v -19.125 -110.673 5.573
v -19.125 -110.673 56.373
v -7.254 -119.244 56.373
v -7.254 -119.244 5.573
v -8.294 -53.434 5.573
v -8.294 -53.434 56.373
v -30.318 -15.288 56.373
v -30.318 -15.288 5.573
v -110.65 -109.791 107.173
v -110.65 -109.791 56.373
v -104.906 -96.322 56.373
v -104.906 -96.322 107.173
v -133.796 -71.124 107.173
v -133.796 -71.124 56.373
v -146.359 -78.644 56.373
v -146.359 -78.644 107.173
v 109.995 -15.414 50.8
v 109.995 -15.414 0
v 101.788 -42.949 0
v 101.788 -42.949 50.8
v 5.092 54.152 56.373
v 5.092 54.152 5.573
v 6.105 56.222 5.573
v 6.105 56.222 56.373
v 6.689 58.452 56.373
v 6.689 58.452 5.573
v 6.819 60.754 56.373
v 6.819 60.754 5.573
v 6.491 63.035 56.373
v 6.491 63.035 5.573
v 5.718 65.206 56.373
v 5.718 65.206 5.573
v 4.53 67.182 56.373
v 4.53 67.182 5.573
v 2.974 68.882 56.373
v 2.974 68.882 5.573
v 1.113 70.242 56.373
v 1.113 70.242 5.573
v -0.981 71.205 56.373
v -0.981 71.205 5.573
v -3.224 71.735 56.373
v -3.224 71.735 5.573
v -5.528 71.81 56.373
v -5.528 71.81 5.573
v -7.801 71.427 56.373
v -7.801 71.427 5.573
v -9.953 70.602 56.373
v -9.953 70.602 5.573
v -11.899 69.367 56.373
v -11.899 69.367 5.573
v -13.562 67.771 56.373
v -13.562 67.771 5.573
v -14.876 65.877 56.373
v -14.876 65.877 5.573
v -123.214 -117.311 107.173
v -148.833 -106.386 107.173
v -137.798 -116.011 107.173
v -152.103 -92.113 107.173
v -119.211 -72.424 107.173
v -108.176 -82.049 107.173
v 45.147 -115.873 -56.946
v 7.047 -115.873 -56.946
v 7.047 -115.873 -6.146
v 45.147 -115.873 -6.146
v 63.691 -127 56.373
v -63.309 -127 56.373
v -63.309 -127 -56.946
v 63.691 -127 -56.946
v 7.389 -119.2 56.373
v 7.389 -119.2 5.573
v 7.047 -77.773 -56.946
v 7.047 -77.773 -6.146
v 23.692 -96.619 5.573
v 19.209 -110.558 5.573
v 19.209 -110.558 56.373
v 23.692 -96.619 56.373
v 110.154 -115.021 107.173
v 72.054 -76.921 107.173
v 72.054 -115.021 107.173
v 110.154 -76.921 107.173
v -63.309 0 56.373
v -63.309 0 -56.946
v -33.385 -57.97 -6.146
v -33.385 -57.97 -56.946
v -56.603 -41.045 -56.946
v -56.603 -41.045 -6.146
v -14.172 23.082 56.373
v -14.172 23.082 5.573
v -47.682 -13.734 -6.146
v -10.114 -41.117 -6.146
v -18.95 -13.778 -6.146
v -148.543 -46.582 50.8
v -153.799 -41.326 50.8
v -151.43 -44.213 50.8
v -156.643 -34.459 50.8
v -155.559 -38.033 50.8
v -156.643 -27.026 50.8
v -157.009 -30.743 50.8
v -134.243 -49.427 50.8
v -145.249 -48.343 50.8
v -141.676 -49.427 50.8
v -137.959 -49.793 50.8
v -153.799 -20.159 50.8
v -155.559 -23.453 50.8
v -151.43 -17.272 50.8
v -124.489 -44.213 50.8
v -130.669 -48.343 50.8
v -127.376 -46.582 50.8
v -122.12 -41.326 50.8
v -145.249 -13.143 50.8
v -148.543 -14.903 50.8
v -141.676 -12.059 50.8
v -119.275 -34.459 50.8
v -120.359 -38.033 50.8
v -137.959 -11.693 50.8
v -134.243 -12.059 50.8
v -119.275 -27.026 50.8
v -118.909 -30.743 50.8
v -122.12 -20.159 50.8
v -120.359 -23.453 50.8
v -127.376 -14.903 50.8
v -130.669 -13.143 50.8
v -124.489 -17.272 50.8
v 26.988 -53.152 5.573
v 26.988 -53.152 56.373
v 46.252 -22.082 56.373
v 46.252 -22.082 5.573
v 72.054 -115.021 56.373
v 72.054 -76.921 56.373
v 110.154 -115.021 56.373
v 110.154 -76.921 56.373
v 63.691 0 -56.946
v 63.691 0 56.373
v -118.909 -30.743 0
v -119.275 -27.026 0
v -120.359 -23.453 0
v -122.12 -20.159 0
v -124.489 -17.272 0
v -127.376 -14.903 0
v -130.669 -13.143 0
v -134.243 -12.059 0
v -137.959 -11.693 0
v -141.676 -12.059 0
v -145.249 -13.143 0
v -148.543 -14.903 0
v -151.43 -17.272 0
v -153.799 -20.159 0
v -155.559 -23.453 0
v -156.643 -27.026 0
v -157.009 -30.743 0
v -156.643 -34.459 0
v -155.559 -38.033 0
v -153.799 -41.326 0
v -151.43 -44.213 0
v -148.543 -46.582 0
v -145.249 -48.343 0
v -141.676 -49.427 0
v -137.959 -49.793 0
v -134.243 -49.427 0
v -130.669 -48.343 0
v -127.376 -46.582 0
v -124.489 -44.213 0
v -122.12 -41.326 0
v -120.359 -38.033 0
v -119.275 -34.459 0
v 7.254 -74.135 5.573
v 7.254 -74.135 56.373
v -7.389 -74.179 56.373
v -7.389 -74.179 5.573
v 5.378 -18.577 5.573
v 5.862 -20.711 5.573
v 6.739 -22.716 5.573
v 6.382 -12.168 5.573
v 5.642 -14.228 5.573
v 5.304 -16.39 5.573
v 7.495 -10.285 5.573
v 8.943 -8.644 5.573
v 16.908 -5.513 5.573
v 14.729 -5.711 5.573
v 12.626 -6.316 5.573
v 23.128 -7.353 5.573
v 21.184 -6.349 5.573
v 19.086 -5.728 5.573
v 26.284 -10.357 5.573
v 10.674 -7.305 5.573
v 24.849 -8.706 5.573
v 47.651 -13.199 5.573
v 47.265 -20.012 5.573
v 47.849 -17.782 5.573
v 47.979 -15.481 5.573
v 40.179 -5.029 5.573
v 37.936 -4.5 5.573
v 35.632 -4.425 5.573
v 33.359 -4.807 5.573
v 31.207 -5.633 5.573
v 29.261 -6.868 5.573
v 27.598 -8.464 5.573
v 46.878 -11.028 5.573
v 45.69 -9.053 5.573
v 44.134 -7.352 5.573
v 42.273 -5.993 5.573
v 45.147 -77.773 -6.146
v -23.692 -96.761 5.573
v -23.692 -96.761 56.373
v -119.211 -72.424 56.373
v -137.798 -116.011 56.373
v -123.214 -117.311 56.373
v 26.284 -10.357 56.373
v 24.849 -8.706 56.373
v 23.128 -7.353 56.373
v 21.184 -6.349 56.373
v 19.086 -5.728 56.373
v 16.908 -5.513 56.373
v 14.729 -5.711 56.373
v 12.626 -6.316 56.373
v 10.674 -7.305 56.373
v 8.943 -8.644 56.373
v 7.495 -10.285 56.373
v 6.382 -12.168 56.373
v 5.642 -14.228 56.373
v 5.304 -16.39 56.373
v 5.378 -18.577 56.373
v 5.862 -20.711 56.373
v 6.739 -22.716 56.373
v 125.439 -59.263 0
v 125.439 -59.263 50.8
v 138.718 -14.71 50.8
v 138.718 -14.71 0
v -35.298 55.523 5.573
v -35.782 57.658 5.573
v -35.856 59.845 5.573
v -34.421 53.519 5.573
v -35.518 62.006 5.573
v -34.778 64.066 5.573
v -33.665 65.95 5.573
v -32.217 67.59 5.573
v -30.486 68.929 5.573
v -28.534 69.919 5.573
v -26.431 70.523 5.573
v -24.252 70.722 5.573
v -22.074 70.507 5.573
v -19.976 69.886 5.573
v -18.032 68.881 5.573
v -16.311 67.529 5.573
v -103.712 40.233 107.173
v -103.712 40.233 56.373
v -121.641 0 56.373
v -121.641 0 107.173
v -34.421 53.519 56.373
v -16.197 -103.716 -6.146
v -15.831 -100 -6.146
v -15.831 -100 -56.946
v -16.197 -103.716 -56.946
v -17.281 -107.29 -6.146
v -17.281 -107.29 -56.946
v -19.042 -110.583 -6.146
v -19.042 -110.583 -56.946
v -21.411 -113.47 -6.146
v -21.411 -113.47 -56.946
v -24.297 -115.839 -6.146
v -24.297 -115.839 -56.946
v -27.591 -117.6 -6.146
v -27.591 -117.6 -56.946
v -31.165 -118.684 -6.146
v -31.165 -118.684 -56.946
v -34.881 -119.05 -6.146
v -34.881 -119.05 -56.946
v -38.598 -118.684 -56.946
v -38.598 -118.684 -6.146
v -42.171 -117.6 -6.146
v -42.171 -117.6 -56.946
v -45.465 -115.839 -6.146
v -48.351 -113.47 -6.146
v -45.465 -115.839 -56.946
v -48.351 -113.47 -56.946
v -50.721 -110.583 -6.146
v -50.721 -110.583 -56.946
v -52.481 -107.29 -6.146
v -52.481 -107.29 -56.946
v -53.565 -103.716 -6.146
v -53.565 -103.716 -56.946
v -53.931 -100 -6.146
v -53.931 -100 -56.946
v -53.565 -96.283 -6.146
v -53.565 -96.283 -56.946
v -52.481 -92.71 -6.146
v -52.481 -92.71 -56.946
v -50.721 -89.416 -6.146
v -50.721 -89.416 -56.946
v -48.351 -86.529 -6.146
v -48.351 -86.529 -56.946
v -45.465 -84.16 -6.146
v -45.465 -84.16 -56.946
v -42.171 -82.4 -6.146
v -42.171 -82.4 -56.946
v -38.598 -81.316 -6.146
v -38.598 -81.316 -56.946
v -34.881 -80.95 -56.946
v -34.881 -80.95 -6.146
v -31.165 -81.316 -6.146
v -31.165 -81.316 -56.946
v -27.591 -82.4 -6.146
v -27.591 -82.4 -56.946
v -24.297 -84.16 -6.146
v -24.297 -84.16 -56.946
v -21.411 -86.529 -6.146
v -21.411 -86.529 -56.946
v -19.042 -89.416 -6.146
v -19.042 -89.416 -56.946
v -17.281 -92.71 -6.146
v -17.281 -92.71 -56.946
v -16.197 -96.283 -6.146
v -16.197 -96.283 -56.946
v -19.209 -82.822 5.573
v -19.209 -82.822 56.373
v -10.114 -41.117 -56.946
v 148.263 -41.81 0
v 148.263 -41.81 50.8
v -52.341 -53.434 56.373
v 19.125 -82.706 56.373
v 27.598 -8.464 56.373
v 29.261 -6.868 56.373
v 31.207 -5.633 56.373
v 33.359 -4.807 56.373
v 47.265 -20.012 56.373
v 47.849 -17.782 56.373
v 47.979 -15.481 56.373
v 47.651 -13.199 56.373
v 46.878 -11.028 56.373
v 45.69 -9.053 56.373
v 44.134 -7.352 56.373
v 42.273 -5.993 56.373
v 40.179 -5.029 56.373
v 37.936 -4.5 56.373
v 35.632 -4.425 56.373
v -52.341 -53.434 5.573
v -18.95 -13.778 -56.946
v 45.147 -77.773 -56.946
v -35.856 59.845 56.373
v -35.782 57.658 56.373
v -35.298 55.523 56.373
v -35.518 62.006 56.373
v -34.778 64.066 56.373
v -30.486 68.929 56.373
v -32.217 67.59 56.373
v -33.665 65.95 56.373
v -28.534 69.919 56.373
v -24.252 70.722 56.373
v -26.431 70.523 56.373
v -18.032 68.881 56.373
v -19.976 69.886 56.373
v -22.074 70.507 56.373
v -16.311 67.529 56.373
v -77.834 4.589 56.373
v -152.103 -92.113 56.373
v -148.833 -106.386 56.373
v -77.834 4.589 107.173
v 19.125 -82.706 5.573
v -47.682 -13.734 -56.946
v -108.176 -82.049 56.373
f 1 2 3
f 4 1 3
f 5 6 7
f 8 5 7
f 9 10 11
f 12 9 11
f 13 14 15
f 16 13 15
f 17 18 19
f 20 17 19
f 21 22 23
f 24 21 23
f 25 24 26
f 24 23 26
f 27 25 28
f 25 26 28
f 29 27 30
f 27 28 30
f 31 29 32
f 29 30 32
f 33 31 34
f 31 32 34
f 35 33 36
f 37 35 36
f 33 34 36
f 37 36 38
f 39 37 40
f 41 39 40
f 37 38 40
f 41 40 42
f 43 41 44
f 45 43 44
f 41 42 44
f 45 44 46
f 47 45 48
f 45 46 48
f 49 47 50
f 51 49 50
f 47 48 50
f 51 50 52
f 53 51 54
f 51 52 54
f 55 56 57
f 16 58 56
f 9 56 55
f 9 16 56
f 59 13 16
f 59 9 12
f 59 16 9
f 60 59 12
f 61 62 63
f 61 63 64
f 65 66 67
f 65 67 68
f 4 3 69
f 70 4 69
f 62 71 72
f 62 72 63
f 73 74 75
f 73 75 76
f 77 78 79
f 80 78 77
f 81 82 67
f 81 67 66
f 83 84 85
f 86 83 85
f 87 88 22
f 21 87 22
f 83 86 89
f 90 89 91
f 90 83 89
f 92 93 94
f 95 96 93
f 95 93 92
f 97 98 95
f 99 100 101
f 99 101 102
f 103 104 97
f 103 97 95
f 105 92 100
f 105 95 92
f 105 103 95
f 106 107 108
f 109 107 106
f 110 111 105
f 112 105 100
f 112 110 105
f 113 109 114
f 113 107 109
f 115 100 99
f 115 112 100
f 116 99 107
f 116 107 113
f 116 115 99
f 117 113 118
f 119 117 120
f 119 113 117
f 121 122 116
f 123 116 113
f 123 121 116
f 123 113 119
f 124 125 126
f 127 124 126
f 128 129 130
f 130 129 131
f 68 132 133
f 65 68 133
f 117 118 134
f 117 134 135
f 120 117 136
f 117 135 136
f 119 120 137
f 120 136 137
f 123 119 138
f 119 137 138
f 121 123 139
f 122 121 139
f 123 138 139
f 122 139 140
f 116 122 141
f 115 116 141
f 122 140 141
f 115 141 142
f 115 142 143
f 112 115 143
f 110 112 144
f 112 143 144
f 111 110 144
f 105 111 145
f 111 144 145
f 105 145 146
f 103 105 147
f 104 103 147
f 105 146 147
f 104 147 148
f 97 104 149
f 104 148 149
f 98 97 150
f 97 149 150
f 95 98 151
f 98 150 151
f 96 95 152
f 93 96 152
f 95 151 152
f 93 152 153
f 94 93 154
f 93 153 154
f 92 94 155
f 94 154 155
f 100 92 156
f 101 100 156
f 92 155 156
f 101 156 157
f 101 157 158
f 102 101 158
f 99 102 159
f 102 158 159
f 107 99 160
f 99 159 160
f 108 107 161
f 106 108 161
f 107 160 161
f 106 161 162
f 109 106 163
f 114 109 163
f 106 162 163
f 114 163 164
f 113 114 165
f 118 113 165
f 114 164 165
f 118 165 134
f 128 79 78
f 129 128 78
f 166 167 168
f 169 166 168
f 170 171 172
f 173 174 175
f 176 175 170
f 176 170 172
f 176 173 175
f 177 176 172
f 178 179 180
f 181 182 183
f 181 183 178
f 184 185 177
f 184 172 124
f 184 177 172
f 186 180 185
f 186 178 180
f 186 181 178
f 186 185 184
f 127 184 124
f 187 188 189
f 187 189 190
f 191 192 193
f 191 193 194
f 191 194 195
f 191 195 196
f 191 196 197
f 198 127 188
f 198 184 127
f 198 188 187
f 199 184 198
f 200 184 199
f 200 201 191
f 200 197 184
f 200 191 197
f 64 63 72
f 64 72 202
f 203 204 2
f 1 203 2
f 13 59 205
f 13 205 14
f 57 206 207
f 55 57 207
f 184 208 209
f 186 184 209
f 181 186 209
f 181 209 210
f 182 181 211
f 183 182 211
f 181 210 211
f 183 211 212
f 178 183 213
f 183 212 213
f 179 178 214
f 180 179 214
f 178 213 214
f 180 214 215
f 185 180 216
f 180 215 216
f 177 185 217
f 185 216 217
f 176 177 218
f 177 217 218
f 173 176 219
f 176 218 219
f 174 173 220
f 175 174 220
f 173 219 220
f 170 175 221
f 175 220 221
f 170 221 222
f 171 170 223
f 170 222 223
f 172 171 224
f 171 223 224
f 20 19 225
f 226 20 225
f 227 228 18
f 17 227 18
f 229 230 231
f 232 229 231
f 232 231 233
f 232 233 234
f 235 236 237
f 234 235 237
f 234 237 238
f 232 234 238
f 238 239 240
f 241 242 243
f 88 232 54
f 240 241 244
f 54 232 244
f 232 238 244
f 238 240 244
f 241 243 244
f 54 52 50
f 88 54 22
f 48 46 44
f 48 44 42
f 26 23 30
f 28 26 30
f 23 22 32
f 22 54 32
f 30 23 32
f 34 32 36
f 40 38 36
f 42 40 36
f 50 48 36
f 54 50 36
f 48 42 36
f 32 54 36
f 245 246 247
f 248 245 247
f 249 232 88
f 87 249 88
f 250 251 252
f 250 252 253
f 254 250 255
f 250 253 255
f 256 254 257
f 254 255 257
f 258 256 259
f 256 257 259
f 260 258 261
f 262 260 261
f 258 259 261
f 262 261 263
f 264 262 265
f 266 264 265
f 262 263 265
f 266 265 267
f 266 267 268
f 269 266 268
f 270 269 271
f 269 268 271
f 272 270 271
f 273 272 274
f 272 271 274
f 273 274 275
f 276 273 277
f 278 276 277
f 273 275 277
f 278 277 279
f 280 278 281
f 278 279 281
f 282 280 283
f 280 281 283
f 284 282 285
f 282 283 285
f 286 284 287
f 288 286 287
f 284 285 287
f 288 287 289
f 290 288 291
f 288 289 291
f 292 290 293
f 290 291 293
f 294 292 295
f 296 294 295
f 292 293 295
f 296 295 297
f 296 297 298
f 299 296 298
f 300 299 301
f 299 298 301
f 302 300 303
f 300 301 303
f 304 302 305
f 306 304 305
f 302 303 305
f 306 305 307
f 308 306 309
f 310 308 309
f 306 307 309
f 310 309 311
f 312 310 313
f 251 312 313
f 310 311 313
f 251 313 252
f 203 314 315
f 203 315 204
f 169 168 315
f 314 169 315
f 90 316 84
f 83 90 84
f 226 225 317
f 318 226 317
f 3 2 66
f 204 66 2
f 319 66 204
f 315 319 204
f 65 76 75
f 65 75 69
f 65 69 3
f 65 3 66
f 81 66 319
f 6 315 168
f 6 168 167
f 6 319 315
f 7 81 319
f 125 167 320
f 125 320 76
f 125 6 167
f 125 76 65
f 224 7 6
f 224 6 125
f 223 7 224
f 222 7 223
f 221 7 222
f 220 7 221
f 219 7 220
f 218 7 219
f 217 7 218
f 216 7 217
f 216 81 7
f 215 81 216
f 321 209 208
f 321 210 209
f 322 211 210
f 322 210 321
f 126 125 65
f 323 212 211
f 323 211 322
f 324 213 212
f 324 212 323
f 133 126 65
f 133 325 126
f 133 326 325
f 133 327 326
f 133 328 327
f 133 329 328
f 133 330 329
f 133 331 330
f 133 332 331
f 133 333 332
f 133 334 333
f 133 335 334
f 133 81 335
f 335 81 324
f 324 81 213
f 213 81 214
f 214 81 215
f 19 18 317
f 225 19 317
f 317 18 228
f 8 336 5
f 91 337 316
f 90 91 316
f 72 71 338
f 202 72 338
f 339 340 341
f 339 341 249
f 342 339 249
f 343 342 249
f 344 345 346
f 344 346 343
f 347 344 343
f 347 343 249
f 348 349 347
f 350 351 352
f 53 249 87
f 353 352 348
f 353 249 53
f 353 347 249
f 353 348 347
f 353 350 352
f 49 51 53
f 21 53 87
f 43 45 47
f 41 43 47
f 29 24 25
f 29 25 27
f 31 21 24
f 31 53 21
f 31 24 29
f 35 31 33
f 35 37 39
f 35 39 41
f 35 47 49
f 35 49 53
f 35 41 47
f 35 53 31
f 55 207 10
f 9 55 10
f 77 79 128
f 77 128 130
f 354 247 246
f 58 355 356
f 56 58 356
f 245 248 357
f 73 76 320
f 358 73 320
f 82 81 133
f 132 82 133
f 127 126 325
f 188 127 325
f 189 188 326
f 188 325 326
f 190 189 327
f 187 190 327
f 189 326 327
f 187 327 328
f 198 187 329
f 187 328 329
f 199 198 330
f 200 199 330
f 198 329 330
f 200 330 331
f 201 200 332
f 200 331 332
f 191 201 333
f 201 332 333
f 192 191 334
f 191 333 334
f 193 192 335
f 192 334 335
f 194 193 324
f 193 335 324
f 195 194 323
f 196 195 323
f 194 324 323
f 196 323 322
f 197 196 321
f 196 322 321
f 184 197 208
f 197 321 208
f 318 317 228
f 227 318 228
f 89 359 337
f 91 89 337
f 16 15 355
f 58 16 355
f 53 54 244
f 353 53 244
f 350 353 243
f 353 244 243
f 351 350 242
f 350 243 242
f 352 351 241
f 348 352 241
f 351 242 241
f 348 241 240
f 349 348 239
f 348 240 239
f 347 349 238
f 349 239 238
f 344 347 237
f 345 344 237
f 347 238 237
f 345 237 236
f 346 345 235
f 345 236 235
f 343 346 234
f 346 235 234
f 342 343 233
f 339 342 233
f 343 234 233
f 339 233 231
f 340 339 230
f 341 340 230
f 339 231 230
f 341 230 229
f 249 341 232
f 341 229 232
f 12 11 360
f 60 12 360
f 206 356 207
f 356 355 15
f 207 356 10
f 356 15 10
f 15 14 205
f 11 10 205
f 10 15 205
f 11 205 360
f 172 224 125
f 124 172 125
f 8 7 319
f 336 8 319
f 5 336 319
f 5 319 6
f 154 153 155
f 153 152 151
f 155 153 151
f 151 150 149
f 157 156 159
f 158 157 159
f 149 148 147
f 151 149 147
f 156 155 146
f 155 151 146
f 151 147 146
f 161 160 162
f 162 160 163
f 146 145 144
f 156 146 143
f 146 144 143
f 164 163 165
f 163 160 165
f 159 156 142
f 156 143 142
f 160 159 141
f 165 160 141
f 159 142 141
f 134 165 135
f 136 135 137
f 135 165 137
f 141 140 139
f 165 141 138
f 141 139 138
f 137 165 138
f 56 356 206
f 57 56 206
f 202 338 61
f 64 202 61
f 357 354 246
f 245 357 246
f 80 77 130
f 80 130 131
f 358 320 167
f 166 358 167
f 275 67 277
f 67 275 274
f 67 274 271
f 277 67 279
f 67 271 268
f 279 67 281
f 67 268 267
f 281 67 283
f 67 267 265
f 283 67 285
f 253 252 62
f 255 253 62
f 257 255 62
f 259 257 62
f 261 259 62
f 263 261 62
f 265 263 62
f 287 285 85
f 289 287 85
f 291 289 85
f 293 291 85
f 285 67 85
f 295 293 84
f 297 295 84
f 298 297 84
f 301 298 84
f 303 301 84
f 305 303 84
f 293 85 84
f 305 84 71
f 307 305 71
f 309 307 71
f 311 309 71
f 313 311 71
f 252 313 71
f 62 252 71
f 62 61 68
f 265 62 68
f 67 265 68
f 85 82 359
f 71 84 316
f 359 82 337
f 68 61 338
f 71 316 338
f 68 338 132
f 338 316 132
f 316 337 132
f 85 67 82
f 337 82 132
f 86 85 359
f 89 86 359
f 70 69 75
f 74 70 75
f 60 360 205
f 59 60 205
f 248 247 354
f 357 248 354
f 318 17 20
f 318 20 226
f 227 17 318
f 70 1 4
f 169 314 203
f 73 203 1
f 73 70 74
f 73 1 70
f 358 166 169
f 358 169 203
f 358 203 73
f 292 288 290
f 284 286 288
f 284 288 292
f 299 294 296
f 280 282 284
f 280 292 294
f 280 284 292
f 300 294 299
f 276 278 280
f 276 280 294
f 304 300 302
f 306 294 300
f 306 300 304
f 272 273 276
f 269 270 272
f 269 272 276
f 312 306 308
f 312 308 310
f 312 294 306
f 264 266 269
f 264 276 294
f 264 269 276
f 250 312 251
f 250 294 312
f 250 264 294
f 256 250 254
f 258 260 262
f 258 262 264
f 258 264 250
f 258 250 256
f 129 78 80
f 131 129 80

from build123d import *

# Parameters (mm, degrees)
F0_W      = 127
F0_H      = 113.3191107269
F1_DEPTH  = 127
F2_R      = 19.05
F3_DEPTH  = 50.8
F4_W      = 38.1
F4_H      = 38.1
F5_DEPTH  = 50.8
F7_DEPTH  = 50.8
F9_DEPTH  = 50.8
F11_DEPTH = 50.8
F13_DEPTH = 50.8
F16_R     = 19.05
F17_DEPTH = 50.8
F14_W     = 38.1
F14_H     = 38.1
F18_DEPTH = 50.8
F20_DEPTH = 50.8
F22_DEPTH = 50.8
F24_DEPTH = 50.8


with BuildPart() as f1:
    # F0 (on Front) → F1 (new body)
    with BuildSketch(Plane.XZ):
        with Locations((0.1909546554, -0.2864338458)):
            Rectangle(F0_W, F0_H)
    extrude(amount=F1_DEPTH)

    # F2 (on face) → F3 (cut)
    with BuildSketch(Plane(origin=(0, 0, -56.9459892092), x_dir=(1, 0, 0), z_dir=(0, 0, -1))):
        with Locations((-34.8810516298, 99.9996215105)):
            Circle(F2_R)
    extrude(amount=-F3_DEPTH, mode=Mode.SUBTRACT)

    # F4 (on face) → F5 (cut)
    with BuildSketch(Plane(origin=(0, 0, -56.9459892092), x_dir=(1, 0, 0), z_dir=(0, 0, -1))):
        with Locations((26.0971351527, 96.8234584603)):
            Rectangle(F4_W, F4_H)
    extrude(amount=-F5_DEPTH, mode=Mode.SUBTRACT)

    # F6 (on face) → F7 (cut)
    with BuildSketch(Plane(origin=(0, 0, -56.9459892092), x_dir=(1, 0, 0), z_dir=(0, 0, -1))):
        Polygon((-56.6030346625, 41.0454806673), (-47.6822181135, 13.7336526435), (-18.9504421823, 13.7780343462), (-10.1140446485, 41.1172917707), (-33.3846265658, 57.9695003836), align=None)
    extrude(amount=-F7_DEPTH, mode=Mode.SUBTRACT)

    # F8 (on face) → F9 (cut)
    with BuildSketch(Plane.XY.offset(56.3731215177)):
        Polygon((-8.294206511, -53.4337777186), (-30.31764359, -15.2880657404), (-52.3410806691, -53.4337777186), align=None)
    extrude(amount=-F9_DEPTH, mode=Mode.SUBTRACT)

    # F10 (on face) → F11 (cut)
    with BuildSketch(Plane.XY.offset(56.3731215177)):
        with BuildLine():
            ThreePointArc((26.2838121714, -10.3574311609), (10.6741557305, -7.3051652924), (6.738505182, -22.7158225105))
            Line((6.738505182, -22.7158225105), (26.9882585853, -53.1520769))
            Line((26.9882585853, -53.1520769), (46.2515082198, -22.0820703393))
            ThreePointArc((46.2515082198, -22.0820703393), (42.2727045666, -5.9928346862), (26.2838121714, -10.3574311609))
        make_face()
    extrude(amount=-F11_DEPTH, mode=Mode.SUBTRACT)

    # F12 (on face) → F13 (cut)
    with BuildSketch(Plane.XY.offset(56.3731215177)):
        Polygon((19.1253523779, -82.7064397891), (7.2535540552, -74.1354135239), (-7.3888553774, -74.1793755884), (-19.2089731938, -82.8215339682), (-23.6919161391, -96.7608778984), (-19.1253523779, -110.6730517785), (-7.2535540552, -119.2440780437), (7.3888553774, -119.2001159792), (19.2089731938, -110.5579575994), (23.6919161391, -96.6186136692), align=None)
    extrude(amount=-F13_DEPTH, mode=Mode.SUBTRACT)


with BuildPart() as f17:
    # F16 (on Top) → F17 (new body)
    with BuildSketch(Plane.XY):
        with Locations((-137.9592269659, -30.7426471263)):
            Circle(F16_R)
    extrude(amount=F17_DEPTH)


with BuildPart() as f18:
    # F14 (on face) → F18 (new body)
    with BuildSketch(Plane.XY.offset(56.3731215177)):
        with Locations((91.1035591245, -95.9713852525)):
            Rectangle(F14_W, F14_H)
    extrude(amount=F18_DEPTH)


with BuildPart() as f18b:
    # F15 (on Top) → F18, piece 2 (new body)
    with BuildSketch(Plane.XY):
        Polygon((148.2630850383, -41.8104374076), (138.7180920668, -14.7104369081), (109.9948949607, -15.4139039698), (101.7879758552, -42.9486710234), (125.4390180111, -59.2626258731), align=None)
    extrude(amount=F18_DEPTH)


with BuildPart() as f20:
    # F19 (on face) → F20 (new body)
    with BuildSketch(Plane.XY.offset(56.3731215177)):
        Polygon((-133.7956904605, -71.1238104015), (-146.3593086234, -78.6442881331), (-152.1030633272, -92.1131918953), (-148.8330354981, -106.3858582423), (-137.7982646227, -116.0106137395), (-123.2136581172, -117.3111289204), (-110.6500399543, -109.7906511888), (-104.9062852505, -96.3217474266), (-108.1763130796, -82.0490810796), (-119.2110839551, -72.4243255824), align=None)
    extrude(amount=F20_DEPTH)


with BuildPart() as f22:
    # F21 (on face) → F22 (new body)
    with BuildSketch(Plane.XY.offset(56.3731215177)):
        Polygon((-77.8342249913, 4.5892671622), (-103.7122182798, 40.2327320114), (-121.6413676739, 0), align=None)
    extrude(amount=F22_DEPTH)


with BuildPart() as f24:
    # F23 (on face) → F24 (new body)
    with BuildSketch(Plane.XY.offset(5.5731215177)):
        with BuildLine():
            ThreePointArc((-14.8761437524, 65.8769807034), (-30.4858001933, 68.929246572), (-34.4214507418, 53.5185893539))
            Line((-34.4214507418, 53.5185893539), (-14.1716973384, 23.0823349643))
            Line((-14.1716973384, 23.0823349643), (5.091552296, 54.152341525))
            ThreePointArc((5.091552296, 54.152341525), (1.1127486428, 70.2415771782), (-14.8761437524, 65.8769807034))
        make_face()
    extrude(amount=F24_DEPTH)


solid = Compound([f1.part, f17.part, f18.part, f18b.part, f20.part, f22.part, f24.part])
